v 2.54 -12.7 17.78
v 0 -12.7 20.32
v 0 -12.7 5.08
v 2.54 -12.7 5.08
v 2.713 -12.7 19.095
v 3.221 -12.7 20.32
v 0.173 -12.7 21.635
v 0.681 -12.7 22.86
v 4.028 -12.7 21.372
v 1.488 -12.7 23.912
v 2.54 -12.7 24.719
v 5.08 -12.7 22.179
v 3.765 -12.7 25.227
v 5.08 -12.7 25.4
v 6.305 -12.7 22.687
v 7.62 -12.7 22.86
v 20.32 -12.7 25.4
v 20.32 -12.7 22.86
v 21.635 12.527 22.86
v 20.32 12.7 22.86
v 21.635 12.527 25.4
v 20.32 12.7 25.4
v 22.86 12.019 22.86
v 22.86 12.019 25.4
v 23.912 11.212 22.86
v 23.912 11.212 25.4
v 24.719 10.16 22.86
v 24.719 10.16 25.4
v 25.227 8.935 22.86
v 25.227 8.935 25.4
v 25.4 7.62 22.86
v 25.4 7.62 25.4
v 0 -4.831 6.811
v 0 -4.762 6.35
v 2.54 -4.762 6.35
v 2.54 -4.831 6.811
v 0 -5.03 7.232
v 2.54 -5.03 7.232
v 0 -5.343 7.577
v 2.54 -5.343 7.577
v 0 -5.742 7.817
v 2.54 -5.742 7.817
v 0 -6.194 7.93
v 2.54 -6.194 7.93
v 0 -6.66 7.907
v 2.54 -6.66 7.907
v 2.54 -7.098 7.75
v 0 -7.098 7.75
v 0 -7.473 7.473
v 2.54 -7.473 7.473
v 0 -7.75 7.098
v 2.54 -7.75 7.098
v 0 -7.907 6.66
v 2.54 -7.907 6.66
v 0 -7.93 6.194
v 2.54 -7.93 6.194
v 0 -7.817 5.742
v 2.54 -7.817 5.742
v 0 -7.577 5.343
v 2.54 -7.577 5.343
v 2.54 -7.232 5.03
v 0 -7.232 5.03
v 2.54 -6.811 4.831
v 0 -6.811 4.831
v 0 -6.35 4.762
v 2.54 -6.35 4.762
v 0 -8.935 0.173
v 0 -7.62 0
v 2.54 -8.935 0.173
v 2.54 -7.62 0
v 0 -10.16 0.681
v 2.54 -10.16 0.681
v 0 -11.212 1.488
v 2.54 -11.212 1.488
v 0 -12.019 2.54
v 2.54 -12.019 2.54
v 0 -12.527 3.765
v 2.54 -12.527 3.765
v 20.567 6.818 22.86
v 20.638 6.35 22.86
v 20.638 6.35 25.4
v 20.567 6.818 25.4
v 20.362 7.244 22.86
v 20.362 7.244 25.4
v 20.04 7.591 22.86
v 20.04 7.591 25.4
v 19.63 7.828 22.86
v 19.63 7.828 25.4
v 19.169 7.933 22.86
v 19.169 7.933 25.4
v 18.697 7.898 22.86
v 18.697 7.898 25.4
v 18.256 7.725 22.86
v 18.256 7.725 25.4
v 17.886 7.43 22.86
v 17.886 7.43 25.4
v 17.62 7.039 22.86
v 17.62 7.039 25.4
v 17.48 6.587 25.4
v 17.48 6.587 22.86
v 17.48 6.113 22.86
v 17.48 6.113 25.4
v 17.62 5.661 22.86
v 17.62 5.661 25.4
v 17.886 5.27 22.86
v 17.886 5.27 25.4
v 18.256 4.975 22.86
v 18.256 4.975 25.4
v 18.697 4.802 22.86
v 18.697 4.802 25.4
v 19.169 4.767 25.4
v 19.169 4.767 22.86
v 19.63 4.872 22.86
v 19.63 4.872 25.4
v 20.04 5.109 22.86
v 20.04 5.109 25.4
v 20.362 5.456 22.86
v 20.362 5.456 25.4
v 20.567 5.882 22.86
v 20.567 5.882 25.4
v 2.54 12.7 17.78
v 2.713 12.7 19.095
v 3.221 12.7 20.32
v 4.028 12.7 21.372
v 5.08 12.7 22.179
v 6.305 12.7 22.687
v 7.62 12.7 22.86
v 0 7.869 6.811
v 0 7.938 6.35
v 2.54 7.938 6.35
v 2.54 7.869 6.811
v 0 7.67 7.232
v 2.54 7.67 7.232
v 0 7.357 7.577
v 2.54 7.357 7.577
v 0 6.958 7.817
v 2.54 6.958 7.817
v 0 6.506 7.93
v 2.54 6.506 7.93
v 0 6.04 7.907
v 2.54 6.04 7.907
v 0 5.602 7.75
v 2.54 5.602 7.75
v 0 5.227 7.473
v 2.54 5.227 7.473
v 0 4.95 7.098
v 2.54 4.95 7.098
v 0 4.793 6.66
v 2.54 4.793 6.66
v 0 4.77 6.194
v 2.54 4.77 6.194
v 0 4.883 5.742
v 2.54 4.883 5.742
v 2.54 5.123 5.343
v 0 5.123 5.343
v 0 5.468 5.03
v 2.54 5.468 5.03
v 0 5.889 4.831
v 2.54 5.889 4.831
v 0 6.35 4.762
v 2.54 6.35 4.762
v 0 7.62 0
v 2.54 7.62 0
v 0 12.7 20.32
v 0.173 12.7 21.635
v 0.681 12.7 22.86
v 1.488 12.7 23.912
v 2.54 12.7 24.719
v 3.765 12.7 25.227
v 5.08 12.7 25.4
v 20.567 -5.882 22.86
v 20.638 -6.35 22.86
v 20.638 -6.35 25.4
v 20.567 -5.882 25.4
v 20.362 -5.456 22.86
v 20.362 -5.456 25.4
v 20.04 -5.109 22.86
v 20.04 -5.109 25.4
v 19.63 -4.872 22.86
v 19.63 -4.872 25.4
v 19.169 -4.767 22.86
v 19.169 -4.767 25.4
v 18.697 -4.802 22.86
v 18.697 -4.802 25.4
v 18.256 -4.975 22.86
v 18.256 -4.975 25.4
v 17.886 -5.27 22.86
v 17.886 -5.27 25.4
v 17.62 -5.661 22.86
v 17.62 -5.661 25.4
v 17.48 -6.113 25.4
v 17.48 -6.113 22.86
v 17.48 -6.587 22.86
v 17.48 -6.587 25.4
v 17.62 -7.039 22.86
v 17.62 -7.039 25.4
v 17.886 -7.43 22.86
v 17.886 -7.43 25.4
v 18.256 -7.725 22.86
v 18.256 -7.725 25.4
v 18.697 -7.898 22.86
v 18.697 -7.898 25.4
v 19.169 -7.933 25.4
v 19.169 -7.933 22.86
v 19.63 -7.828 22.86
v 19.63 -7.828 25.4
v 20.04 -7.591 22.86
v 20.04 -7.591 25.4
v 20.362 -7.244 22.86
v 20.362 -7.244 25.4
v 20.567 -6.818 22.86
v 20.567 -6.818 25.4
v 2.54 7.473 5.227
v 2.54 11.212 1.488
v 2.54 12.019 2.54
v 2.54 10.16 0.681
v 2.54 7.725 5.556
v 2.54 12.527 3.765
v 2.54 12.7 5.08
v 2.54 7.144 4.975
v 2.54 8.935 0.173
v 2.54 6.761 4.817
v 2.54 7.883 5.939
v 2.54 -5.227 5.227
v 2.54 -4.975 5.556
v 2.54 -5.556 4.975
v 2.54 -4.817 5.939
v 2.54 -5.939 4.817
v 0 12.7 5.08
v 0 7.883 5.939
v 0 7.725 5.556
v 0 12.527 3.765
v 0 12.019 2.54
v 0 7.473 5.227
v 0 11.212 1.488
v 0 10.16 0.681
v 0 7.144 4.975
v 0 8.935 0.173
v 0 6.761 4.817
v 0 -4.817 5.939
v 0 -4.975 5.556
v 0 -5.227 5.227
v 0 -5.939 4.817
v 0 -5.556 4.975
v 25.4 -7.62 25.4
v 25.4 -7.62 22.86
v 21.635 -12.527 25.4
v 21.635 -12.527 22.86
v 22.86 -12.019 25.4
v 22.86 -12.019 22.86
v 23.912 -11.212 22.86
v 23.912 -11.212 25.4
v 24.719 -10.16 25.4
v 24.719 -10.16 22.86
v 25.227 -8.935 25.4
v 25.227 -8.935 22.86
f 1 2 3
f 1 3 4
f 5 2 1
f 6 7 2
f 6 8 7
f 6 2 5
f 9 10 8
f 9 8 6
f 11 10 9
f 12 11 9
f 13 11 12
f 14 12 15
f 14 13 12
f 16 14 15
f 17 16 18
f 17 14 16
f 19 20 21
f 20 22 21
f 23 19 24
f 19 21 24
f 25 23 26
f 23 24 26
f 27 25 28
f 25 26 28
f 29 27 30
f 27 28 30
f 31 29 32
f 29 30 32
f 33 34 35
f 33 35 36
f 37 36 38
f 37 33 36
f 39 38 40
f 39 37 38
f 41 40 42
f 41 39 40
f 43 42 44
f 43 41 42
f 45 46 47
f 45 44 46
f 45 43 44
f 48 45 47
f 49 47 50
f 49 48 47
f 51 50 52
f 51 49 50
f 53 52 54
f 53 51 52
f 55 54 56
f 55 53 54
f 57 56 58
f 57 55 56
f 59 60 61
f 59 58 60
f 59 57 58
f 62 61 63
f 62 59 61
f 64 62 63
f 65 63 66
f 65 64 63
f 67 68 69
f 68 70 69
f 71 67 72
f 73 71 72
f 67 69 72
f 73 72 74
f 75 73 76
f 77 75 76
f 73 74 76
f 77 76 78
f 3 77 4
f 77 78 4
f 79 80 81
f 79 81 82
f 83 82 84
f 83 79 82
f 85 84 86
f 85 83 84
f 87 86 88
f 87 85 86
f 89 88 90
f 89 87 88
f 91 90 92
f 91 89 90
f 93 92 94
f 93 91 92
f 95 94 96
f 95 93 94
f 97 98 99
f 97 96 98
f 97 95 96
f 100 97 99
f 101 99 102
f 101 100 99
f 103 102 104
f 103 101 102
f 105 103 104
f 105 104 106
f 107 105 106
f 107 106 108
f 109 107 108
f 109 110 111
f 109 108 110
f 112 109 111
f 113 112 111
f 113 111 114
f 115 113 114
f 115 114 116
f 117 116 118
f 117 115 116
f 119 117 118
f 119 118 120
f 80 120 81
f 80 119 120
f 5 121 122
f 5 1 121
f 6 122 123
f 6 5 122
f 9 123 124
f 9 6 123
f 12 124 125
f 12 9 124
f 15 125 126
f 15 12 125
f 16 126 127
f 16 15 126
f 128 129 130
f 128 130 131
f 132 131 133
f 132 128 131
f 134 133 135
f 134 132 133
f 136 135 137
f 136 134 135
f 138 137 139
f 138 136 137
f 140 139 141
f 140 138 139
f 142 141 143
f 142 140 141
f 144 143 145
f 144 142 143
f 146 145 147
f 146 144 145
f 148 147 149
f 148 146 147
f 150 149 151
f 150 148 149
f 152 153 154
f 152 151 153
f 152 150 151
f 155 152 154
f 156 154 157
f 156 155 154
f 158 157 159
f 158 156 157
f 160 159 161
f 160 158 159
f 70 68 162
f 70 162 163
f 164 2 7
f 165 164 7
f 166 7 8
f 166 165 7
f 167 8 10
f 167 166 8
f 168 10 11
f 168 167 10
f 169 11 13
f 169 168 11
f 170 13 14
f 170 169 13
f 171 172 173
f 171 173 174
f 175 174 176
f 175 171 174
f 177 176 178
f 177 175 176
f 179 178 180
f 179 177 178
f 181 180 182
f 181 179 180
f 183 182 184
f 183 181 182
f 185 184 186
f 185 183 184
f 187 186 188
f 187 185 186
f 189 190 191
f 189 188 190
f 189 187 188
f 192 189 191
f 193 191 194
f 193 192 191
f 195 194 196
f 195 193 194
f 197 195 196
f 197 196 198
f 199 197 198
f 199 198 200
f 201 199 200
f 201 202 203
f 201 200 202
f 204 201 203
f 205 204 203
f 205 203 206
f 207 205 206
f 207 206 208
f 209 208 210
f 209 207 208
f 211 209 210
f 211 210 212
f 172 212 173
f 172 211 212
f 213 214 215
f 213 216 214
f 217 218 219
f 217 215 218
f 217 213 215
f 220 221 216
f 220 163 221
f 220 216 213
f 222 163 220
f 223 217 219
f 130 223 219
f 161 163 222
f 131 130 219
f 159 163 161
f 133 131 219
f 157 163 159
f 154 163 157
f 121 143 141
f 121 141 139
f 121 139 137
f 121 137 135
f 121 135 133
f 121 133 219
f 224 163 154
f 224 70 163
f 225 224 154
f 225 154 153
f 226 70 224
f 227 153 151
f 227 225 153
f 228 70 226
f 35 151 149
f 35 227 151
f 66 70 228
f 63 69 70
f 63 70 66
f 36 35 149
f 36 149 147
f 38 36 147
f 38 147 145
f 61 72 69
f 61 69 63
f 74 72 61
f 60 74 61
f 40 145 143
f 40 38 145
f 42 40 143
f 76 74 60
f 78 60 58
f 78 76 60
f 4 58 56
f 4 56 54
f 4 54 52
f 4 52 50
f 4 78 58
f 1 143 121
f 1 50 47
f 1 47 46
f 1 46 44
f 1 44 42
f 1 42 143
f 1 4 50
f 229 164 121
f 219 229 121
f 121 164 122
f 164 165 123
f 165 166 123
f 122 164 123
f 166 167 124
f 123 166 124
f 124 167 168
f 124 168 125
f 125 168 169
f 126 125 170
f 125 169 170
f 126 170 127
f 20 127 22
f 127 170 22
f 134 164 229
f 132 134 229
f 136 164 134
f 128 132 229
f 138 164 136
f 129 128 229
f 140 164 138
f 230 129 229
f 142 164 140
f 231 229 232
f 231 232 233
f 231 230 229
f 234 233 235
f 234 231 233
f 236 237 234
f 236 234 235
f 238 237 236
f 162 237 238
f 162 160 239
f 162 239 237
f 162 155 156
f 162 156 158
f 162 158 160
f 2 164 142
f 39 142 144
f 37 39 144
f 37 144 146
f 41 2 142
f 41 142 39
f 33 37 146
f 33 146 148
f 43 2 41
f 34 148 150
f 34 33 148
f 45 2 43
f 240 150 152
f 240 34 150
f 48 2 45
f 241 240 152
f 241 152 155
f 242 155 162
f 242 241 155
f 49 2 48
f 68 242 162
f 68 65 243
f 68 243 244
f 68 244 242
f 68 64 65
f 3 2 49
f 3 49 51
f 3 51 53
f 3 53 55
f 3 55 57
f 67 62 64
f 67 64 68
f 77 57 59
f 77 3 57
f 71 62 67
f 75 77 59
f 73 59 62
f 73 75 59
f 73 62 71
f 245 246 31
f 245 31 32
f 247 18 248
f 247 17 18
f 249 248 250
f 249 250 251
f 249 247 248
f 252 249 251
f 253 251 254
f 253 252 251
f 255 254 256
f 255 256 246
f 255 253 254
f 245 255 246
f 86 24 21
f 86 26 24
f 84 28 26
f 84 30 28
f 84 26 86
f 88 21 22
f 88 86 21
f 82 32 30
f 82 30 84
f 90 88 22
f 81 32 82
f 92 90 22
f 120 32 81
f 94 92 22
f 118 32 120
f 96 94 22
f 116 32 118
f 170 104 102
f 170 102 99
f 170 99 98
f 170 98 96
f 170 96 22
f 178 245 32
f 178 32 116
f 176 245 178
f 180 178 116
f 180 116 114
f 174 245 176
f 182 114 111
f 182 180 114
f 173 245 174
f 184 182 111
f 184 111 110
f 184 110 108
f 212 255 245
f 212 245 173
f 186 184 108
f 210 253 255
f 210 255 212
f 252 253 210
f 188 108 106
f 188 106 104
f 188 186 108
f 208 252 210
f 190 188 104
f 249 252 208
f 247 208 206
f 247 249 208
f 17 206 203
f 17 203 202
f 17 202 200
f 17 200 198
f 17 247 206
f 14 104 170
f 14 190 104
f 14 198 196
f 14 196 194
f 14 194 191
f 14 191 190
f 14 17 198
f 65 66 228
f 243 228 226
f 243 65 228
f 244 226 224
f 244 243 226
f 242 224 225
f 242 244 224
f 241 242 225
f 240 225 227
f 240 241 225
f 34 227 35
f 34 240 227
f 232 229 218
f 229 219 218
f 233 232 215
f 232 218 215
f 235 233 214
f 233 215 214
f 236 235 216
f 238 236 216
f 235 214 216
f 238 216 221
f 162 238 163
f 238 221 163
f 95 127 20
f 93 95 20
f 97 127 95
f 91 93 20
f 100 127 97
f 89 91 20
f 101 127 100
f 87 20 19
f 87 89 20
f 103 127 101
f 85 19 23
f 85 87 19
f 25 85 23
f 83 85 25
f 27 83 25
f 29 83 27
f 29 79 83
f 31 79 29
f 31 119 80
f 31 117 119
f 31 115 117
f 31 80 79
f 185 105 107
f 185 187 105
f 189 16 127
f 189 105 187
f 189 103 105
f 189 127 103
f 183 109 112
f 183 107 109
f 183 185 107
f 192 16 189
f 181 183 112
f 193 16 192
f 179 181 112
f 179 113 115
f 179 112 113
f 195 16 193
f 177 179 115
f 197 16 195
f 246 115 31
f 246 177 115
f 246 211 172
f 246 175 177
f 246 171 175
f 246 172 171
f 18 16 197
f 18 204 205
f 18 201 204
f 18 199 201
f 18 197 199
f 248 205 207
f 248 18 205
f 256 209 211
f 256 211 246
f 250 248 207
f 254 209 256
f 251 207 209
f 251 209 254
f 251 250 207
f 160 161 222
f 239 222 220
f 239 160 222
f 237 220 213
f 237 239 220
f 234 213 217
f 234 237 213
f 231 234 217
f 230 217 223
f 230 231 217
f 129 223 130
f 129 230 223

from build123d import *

# Parameters (mm, degrees)
F3_DEPTH = 12.7
F1_R     = 1.5875
F4_DEPTH = 39.37
F5_DEPTH = 8.382
F6_R     = 5.08
F7_R     = 5.08
F8_R     = 5.08


with BuildPart() as f3:
    # F0 (on Front) → F3 (new body, symmetric)
    with BuildSketch(Plane.XZ):
        Polygon((0, 25.4), (0, 0), (2.54, 0), (2.54, 22.86), (25.4, 22.86), (25.4, 25.4), align=None)
    extrude(amount=F3_DEPTH, both=True)

    # F1 (on Top) → F4 (cut)
    with BuildSketch(Plane.XY):
        with Locations((19.05, 6.35)):
            Circle(F1_R)
        with Locations((19.05, -6.35)):
            Circle(F1_R)
    extrude(amount=F4_DEPTH, mode=Mode.SUBTRACT)

    # F2 (on Right) → F5 (cut)
    with BuildSketch(Plane.YZ):
        with BuildLine():
            ThreePointArc((7.9375, 6.35), (5.227468, 7.472532), (6.35, 4.7625))
            ThreePointArc((6.35, 4.7625), (7.472532, 5.227468), (7.9375, 6.35))
        make_face()
        with BuildLine():
            ThreePointArc((-4.7625, 6.35), (-7.472532, 7.472532), (-6.35, 4.7625))
            ThreePointArc((-6.35, 4.7625), (-5.227468, 5.227468), (-4.7625, 6.35))
        make_face()
    extrude(amount=F5_DEPTH, mode=Mode.SUBTRACT)

    # F6
    f6_edges = [f3.edges().sort_by_distance(p)[0] for p in [
        (25.4, -12.7, 24.13),
        (25.4, 12.7, 24.13),
        (1.27, -12.7, 0),
        (1.27, 12.7, 0),
    ]]
    fillet(f6_edges, radius=F6_R)

    # F7
    f7_edges = [f3.edges().sort_by_distance(p)[0] for p in [
        (0, 0, 25.4),
    ]]
    fillet(f7_edges, radius=F7_R)

    # F8
    f8_edges = [f3.edges().sort_by_distance(p)[0] for p in [
        (2.54, 0, 22.86),
    ]]
    fillet(f8_edges, radius=F8_R)


solid = f3.part
